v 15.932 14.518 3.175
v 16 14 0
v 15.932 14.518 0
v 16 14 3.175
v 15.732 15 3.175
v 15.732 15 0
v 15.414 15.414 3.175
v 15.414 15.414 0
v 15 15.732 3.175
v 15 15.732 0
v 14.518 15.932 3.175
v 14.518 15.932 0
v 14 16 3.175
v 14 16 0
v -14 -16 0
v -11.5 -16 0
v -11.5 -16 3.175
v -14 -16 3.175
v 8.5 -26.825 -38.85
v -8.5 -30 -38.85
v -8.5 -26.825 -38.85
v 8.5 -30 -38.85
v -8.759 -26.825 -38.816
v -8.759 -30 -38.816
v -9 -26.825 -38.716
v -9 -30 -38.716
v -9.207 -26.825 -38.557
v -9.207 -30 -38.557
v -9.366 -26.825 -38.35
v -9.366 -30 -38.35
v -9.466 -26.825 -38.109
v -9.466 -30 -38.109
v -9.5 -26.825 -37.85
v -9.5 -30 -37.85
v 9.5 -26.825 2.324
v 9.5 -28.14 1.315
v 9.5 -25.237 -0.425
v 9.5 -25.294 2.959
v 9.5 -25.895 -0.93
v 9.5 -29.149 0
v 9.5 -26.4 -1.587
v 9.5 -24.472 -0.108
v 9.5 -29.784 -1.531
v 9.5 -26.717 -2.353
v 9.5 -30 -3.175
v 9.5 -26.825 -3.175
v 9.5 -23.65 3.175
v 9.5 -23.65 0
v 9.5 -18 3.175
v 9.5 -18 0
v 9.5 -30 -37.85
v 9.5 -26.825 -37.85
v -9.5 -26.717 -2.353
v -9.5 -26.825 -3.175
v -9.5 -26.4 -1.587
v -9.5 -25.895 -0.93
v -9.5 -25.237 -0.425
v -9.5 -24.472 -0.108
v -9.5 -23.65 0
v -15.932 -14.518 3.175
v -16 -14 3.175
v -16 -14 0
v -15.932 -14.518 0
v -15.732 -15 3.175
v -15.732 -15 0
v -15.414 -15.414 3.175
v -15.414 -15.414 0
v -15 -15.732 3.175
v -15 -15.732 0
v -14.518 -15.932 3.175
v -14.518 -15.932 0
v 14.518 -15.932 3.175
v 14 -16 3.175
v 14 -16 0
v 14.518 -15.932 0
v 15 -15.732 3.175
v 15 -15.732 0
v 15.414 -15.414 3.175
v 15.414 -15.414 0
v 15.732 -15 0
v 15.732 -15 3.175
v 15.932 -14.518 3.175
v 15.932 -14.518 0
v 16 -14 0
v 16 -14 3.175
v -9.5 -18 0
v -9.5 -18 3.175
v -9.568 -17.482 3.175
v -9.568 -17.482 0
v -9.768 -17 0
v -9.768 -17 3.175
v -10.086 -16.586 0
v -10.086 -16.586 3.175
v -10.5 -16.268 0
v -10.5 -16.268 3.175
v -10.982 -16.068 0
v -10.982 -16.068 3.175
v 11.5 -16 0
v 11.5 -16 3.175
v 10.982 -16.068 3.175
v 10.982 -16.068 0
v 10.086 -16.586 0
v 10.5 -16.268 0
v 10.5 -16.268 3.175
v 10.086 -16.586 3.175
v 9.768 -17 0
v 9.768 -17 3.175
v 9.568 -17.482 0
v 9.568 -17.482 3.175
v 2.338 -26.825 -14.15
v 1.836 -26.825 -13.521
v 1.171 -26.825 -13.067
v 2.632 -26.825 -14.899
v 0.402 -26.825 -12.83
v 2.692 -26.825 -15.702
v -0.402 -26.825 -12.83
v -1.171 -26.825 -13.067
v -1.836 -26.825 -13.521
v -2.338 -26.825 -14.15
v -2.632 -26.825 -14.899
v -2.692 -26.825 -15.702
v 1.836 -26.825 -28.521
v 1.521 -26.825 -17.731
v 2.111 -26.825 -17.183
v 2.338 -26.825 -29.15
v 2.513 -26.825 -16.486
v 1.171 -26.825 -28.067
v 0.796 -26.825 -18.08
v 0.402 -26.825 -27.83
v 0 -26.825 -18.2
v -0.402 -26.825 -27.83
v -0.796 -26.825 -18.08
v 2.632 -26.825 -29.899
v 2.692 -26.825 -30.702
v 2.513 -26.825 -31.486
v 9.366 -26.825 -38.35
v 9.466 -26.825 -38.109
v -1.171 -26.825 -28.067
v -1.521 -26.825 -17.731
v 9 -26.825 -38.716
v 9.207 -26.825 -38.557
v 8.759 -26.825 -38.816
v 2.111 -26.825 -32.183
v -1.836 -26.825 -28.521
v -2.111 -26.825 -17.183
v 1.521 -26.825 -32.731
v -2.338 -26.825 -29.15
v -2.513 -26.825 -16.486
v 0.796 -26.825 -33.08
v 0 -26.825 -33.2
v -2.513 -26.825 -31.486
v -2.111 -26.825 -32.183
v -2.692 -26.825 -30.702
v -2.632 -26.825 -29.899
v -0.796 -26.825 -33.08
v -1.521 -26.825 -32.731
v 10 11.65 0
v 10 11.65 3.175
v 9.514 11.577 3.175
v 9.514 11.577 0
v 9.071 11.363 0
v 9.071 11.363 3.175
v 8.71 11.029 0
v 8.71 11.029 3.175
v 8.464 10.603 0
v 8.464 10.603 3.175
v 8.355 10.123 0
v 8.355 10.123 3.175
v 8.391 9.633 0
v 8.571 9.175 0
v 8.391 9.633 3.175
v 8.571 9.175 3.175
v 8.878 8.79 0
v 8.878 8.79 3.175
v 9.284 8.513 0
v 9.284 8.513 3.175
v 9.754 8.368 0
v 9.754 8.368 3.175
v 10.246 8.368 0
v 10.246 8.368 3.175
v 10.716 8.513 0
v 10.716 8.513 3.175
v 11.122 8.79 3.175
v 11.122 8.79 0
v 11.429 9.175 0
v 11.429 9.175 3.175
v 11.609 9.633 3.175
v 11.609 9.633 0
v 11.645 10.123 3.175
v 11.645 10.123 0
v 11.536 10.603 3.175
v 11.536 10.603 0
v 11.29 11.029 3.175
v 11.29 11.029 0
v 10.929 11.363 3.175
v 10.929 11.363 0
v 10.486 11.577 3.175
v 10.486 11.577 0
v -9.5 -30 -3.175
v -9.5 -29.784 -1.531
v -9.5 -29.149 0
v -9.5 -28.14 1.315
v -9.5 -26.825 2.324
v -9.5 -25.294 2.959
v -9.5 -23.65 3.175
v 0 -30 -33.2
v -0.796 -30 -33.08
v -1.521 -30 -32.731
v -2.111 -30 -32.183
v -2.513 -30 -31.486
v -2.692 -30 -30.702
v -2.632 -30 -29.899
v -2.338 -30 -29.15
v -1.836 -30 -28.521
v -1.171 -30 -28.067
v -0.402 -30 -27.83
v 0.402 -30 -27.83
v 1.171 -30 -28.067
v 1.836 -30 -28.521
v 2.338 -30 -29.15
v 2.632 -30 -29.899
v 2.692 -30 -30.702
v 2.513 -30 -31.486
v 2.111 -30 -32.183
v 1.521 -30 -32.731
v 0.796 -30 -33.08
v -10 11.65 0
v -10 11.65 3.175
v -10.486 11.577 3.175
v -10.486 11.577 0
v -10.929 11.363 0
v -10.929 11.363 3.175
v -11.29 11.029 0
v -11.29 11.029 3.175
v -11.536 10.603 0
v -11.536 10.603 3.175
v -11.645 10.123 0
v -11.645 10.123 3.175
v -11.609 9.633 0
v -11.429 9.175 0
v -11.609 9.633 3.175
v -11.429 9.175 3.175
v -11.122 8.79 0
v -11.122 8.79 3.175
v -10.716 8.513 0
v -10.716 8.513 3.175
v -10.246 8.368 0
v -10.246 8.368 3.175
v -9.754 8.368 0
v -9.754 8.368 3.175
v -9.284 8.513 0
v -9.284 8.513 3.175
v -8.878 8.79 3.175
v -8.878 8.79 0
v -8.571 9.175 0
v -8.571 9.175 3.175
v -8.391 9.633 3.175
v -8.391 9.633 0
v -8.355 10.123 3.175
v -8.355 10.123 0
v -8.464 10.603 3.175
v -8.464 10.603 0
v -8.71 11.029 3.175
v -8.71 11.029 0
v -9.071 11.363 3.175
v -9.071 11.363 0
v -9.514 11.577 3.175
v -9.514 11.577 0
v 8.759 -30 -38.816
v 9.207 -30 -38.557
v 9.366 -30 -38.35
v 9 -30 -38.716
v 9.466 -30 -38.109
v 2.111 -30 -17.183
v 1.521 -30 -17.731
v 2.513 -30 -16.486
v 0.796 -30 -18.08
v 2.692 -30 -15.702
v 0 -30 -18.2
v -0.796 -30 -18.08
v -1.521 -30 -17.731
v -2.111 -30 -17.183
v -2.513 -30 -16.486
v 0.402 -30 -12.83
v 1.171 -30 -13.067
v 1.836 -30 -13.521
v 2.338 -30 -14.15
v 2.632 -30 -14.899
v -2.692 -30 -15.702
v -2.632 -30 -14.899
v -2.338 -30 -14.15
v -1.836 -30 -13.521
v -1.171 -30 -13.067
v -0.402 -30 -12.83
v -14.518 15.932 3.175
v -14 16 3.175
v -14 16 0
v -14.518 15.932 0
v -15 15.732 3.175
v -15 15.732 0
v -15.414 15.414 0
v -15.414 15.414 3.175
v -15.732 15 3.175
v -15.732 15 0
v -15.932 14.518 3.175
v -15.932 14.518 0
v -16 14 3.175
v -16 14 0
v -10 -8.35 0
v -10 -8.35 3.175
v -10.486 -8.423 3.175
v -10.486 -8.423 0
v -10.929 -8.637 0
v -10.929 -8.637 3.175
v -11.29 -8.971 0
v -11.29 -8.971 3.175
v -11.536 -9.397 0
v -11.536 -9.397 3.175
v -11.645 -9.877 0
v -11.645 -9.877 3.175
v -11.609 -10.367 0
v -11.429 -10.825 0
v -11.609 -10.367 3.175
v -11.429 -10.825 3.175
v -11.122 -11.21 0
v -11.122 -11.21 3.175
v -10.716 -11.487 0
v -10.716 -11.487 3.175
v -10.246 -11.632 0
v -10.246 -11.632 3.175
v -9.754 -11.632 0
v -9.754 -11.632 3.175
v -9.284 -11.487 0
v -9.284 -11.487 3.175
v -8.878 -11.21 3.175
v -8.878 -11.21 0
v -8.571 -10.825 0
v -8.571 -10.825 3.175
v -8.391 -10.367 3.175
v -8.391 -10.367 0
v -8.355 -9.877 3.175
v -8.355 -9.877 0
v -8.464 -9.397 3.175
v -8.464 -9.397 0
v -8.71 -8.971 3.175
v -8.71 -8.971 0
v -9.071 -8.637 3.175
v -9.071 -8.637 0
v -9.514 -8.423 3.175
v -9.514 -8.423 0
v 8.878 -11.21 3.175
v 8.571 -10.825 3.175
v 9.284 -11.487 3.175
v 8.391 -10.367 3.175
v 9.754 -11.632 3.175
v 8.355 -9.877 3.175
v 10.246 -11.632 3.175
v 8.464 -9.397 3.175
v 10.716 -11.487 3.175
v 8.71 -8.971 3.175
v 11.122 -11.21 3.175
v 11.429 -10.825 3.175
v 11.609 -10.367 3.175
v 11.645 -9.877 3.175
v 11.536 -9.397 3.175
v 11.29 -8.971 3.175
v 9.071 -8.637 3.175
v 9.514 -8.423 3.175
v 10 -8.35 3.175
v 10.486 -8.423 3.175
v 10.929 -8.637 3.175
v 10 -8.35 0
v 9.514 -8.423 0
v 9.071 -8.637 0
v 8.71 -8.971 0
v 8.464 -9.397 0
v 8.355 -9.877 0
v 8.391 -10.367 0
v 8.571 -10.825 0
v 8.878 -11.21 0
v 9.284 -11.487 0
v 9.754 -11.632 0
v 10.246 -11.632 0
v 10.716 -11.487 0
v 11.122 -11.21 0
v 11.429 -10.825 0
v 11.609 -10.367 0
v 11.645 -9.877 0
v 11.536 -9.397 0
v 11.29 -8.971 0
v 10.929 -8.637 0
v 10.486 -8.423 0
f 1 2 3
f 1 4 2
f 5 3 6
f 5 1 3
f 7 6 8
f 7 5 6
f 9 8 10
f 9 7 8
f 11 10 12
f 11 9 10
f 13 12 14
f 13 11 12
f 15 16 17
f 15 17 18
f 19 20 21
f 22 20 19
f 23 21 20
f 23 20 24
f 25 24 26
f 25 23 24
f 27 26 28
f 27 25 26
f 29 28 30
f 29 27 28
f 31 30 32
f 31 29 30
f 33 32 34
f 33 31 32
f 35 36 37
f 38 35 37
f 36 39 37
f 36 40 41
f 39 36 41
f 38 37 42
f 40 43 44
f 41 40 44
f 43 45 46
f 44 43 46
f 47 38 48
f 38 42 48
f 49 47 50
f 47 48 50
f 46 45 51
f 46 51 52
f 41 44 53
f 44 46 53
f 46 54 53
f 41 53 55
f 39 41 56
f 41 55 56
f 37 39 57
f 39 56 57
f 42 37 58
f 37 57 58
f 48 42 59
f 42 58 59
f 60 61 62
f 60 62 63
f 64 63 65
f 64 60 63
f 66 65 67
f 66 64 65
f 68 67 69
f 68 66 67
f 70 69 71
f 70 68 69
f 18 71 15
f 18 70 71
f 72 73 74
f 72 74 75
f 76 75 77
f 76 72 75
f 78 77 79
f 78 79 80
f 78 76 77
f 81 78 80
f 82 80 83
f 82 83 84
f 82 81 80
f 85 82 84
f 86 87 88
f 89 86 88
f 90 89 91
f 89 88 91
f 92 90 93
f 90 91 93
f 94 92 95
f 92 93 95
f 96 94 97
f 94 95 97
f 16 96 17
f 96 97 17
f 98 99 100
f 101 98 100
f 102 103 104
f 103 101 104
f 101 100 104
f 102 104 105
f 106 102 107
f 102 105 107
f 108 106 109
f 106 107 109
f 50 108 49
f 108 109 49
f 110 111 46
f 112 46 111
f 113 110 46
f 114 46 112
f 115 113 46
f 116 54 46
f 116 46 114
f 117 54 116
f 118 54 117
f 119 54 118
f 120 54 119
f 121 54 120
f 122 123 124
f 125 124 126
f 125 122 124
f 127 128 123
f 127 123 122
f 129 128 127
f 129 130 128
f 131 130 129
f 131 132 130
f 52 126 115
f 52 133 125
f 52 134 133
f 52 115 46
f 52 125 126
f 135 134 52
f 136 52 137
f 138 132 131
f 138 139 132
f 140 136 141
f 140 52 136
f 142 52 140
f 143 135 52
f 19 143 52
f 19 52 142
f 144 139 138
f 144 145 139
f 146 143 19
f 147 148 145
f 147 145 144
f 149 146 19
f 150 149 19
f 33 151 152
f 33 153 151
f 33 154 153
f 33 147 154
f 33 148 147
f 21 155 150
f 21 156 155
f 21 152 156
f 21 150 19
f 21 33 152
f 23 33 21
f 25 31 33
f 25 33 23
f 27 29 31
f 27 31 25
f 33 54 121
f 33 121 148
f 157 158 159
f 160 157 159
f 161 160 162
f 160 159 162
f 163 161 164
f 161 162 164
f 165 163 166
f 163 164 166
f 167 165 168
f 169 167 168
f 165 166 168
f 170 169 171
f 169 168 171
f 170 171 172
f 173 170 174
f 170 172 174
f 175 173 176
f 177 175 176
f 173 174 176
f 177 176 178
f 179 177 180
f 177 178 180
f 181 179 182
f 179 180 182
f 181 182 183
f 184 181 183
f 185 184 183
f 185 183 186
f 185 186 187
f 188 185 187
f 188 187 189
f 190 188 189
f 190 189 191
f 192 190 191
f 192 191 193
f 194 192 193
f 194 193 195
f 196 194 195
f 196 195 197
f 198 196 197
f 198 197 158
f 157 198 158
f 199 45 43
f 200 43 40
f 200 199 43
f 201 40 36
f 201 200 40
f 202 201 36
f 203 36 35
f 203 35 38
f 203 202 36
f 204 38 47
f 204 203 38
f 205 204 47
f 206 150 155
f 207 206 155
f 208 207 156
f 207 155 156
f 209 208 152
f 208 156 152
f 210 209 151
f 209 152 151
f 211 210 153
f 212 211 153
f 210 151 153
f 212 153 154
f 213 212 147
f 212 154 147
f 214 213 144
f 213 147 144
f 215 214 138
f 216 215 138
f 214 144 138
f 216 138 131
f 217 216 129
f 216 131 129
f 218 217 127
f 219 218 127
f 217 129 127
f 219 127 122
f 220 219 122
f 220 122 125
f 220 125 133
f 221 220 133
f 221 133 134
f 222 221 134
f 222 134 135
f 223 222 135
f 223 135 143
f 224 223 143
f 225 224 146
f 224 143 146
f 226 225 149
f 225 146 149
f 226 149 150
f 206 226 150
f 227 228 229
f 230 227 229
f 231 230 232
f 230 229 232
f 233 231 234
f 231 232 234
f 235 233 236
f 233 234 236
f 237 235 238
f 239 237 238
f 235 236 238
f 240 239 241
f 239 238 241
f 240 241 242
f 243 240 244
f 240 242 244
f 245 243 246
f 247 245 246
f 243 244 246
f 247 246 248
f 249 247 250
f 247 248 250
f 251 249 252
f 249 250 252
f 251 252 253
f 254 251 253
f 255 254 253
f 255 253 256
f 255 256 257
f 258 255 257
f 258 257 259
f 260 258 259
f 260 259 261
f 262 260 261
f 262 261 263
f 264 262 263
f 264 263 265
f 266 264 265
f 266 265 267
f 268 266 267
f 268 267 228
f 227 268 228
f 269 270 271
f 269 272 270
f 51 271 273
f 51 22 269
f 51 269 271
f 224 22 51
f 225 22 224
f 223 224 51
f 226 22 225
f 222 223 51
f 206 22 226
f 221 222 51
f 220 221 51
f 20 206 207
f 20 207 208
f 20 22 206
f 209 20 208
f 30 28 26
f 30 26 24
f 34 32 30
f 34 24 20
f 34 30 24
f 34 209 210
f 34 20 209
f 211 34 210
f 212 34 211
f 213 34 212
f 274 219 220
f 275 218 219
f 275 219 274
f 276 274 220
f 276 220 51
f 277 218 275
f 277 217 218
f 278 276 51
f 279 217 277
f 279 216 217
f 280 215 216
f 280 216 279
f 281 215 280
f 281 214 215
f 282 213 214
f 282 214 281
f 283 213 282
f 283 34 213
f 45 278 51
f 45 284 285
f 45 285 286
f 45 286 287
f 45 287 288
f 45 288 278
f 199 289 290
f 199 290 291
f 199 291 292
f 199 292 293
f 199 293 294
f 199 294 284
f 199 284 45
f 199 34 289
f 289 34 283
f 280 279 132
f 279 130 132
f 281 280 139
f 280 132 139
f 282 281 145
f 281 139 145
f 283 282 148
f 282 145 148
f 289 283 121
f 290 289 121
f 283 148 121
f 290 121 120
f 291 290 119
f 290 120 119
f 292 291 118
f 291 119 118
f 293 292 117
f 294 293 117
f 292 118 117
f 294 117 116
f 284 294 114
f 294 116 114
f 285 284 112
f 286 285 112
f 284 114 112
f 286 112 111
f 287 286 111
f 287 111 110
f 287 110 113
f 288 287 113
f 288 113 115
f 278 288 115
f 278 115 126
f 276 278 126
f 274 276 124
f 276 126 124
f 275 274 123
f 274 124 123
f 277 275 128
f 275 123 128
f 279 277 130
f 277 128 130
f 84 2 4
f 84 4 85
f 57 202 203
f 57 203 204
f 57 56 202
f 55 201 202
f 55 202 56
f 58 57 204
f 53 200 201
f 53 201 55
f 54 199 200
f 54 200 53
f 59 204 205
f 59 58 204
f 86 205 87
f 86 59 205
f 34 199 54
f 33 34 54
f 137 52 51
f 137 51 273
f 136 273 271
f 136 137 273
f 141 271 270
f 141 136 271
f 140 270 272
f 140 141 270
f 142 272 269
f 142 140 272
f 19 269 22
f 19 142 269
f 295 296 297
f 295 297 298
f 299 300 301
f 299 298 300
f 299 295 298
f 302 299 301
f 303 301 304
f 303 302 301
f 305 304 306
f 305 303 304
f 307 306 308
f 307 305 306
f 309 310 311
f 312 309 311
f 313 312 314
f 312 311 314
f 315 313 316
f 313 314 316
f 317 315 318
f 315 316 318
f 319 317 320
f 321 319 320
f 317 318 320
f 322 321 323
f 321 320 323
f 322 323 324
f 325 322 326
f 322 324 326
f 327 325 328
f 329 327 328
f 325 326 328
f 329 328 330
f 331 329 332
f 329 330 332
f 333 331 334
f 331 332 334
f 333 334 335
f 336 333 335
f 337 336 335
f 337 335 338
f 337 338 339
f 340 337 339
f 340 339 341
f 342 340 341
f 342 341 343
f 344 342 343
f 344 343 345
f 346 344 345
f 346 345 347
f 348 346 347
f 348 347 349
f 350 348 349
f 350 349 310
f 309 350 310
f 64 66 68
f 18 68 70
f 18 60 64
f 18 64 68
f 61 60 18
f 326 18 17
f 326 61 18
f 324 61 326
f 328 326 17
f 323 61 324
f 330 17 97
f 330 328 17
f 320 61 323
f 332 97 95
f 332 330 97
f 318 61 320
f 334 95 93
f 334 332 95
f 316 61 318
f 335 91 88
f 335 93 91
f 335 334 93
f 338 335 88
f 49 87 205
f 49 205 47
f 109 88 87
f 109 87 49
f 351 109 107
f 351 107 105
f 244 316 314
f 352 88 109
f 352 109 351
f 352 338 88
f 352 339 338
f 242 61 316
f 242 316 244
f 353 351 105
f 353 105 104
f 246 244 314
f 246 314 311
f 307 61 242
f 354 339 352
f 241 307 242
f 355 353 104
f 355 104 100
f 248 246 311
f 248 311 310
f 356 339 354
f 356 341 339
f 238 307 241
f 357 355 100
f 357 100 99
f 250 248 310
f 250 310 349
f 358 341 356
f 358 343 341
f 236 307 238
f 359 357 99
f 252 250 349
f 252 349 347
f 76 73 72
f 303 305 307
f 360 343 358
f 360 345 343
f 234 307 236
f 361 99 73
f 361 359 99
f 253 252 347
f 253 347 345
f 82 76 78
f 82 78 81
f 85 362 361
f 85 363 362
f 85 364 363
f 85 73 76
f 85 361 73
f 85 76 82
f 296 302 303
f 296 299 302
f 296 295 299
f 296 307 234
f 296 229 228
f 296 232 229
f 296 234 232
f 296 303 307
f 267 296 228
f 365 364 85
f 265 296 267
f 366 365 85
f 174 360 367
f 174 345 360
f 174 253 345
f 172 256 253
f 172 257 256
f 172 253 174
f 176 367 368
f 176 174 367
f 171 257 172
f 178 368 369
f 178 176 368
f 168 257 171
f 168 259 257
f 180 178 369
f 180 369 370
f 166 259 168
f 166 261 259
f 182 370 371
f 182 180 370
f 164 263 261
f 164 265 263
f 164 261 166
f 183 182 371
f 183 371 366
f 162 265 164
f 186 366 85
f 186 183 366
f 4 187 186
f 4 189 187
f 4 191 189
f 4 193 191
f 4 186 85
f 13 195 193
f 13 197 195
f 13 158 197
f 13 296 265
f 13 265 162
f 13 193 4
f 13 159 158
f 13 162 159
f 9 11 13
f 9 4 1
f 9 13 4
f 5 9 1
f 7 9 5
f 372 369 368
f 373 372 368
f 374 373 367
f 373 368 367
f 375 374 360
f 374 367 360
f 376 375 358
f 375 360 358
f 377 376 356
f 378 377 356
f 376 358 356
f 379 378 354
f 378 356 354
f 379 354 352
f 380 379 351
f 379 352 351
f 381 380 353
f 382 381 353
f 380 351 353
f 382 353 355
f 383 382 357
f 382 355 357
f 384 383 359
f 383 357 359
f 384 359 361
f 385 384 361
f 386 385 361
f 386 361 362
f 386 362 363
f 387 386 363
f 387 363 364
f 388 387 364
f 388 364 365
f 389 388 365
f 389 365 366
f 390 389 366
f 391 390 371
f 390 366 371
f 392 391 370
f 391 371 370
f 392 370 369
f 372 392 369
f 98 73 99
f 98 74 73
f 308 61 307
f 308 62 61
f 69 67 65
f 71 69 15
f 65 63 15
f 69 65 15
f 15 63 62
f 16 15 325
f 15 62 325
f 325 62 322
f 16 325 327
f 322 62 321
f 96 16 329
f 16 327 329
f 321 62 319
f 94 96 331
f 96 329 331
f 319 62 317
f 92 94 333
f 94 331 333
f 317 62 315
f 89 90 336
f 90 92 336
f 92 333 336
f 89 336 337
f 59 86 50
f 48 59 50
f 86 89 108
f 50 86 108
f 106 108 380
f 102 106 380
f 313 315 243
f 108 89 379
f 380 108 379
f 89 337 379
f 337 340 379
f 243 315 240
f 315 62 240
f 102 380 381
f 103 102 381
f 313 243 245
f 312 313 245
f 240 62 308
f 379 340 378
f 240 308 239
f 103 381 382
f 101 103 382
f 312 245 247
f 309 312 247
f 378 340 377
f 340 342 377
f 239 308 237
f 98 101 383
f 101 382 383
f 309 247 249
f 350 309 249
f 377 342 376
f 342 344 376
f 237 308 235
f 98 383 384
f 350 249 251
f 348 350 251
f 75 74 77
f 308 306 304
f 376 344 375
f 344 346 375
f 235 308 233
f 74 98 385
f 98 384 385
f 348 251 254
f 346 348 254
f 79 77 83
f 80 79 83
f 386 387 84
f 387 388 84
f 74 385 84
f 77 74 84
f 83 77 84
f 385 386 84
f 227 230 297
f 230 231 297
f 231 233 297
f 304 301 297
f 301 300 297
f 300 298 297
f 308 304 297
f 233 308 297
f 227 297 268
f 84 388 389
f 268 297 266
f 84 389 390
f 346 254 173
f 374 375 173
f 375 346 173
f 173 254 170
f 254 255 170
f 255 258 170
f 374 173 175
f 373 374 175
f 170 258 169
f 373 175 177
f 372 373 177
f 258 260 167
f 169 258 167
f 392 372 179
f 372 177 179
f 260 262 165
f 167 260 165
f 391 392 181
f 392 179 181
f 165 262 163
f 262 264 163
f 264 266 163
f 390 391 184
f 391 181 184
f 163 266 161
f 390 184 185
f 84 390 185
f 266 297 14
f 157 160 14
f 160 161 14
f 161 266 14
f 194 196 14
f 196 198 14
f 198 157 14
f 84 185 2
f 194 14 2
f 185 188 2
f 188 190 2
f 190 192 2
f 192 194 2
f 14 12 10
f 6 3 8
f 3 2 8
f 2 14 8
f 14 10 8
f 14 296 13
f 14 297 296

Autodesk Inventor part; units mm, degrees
ref_plane "YZ Plane" through (0, 0, 0) normal (1, 0, 0) x (0, 1, 0)
ref_plane "XZ Plane" through (0, 0, 0) normal (0, 1, 0) x (-1, 0, 0)
ref_plane "XY Plane" through (0, 0, 0) normal (0, 0, 1) x (1, 0, 0)
sketch "Sketch1" plane through (0, 0, 0) normal (0, 0, 1) x (1, 0, 0)
  line L0 (16, -16) -> (-16, -16)
  line L1 (-16, -16) -> (-16, 16)
  line L2 (-16, 16) -> (16, 16)
  line L3 (16, 16) -> (16, -16)
  line L4 (16, -16) -> (-16, 16) construction
  line L5 (-16, -16) -> (16, 16) construction
  line L6 (10, -10) -> (-10, -10) construction
  line L7 (-10, -10) -> (-10, 10) construction
  line L8 (-10, 10) -> (10, 10) construction
  line L9 (10, 10) -> (10, -10) construction
  line L10 (10, -10) -> (-10, 10) construction
  line L11 (-10, -10) -> (10, 10) construction
  line L12 (-9.5, -16) -> (9.5, -16)
  line L13 (9.5, -16) -> (9.5, -30)
  line L14 (9.5, -30) -> (-9.5, -30)
  line L15 (-9.5, -30) -> (-9.5, -16)
  point P0 (0, 0)
  point P1 (0, -16)
  dimension "d0" = 32
  dimension "d1" = 32
  dimension "d2" = 20
  dimension "d3" = 20
  dimension "d4" = 19
  dimension "d5" = 30
extrude "Plate1" add sketch "Sketch1" along normal blind 3.175
sketch "Sketch2" plane through (-9.5, -26.825, 3.175) normal (0, -1, 0) x (1, 0, 0)
  line L0 (19, 0) -> (0, 0)
  line L1 (0, 0) -> (0, -50)
  line L2 (0, -50) -> (19, -50)
  line L3 (19, -50) -> (19, 0)
edge flange "Flange1" height 50 angle 90 thickness 3.175 bend radius 3.175 thickness toward (0, -1, 0) relief tear relief width 3.175 relief depth 1.5875 edges at (0, -30, 0) wall of the first edge with corners at (9.5, -26.825, 3.175) (-9.5, -26.825, 3.175) (-9.5, -26.825, -46.825) (9.5, -26.825, -46.825)
bend "Bend1"
corner "Corner1"
fillet "Fillet1" radius 2 6 edges at (-16, -16, 1.5875) (-16, 16, 1.5875) (16, 16, 1.5875) (16, -16, 1.5875) (9.5, -16, 1.5875) (-9.5, -16, 1.5875)
hole "Hole1" at (10, -10, 0) at (10, 10, 0) at (-10, 10, 0) at (-10, -10, 0) direction (0, 0, 1) diameter 3.3 end through all
sketch "Sketch3" plane through (-9.5, -30, -46.825) normal (0, -1, 0) x (1, 0, 0)
  line L0 (1.15, 46.825) -> (-2.15, 46.825) construction
  line L1 (1.15, 46.825) -> (-2.15, 46.825) construction
  line L2 (21.15, 46.825) -> (17.85, 46.825) construction
  line L3 (21.15, 46.825) -> (17.85, 46.825) construction
  line L4 (23.5, 46.825) -> (25.5, 46.825) construction
  line L5 (21, 46.825) -> (23.5, 46.825) construction
  line L6 (19, 46.825) -> (21, 46.825) construction
  line L7 (19, 46.825) -> (0, 46.825) construction
  line L8 (-2, 46.825) -> (0, 46.825) construction
  line L9 (-4.5, 46.825) -> (-2, 46.825) construction
  line L10 (-6.5, 46.825) -> (-4.5, 46.825) construction
  line L11 (-4.5, 46.825) -> (-6.5, 46.825) construction
  line L12 (23.5, 46.825) -> (-4.5, 46.825) construction
  line L13 (25.5, 46.825) -> (23.5, 46.825) construction
  line L14 (0, 0) -> (0, 43.65) construction
  line L15 (19, 24.975) -> (0, 24.975) construction
  line L16 (0, 24.975) -> (0, 37.675) construction
  line L17 (0, 37.675) -> (19, 37.675) construction
  line L18 (19, 37.675) -> (19, 24.975) construction
  line L19 (19, 24.975) -> (0, 37.675) construction
  line L20 (0, 24.975) -> (19, 37.675) construction
  line L21 (19, 43.65) -> (19, 0) construction
  line L22 (0, 33.825) -> (19, 33.825) construction
  line L23 (19, 33.825) -> (19, 13.825) construction
  line L24 (19, 13.825) -> (0, 13.825) construction
  line L25 (0, 13.825) -> (0, 33.825) construction
  line L26 (19, 9.975) -> (0, 9.975) construction
  line L27 (0, 9.975) -> (0, 22.675) construction
  line L28 (0, 22.675) -> (19, 22.675) construction
  line L29 (19, 22.675) -> (19, 9.975) construction
  line L30 (19, 9.975) -> (0, 22.675) construction
  line L31 (0, 9.975) -> (19, 22.675) construction
  line L32 (0, 33.825) -> (19, 13.825) construction
  line L33 (0, 13.825) -> (19, 33.825) construction
  line L34 (19, 43.65) -> (0, 43.65) projected
  line L35 (0, 0) -> (0, 43.65) projected
  line L36 (19, 0) -> (0, 0) projected
  line L37 (19, 43.65) -> (19, 0) projected
  line L38 (0, 7.975) -> (19, 7.975)
  point P0 (9.5, 46.825)
  point P1 (9.5, 31.325)
  point P2 (9.5, 46.825)
  point P3 (9.5, 16.325)
  point P4 (9.5, 23.825)
  point P5 (9.5, 23.825)
  point P6 (19, 9.975)
  point P7 (0, 9.975)
  dimension "d25" = 12.7
  dimension "d27" = 20
  dimension "d28" = 13
  dimension "d29" = 7.5
  dimension "d30" = 7.5
  dimension "d33" = 2
extrude "Extrusion1" cut sketch "Sketch3" against normal through all contours L37 L36 L35 L38
fillet "Fillet2" radius 1 2 edges at (9.5, -28.4125, -38.85) (-9.5, -28.4125, -38.85)
hole "Hole2" at (0, -30, -15.5) at (0, -30, -30.5) direction (0, 1, 0) diameter 5.4 end through all
equation "\"d23\" = Thickness"
equation "\"d6\" = Thickness"
equation "\"d7\" = BendReliefWidth"
equation "\"d8\" = BendReliefDepth"
equation "\"d9\" = MinimumRemnant"
equation "\"d10\" = TransitionRadius"
equation "\"d13\" = BendRadius"
equation "\"d14\" = CornerReliefSize"
equation "\"d15\" = GapSize"
equation "\"d16\" = JacobiRadiusSize"
equation "\"d30\" = d29"
equation "\"BendReliefWidth\" = Thickness"
equation "\"BendReliefDepth\" = 0.5 * Thickness"
equation "\"CornerReliefSize\" = 4 * Thickness"
equation "\"MinimumRemnant\" = 2 * Thickness"
equation "\"TransitionRadius\" = BendRadius"
equation "\"JacobiRadiusSize\" = BendRadius"
equation "\"GapSize\" = Thickness"
equation "\"Thickness\" = 3.175"
equation "\"BendRadius\" = 3.175"
properties part number "Printhead Belt Retainer Bracket" material "Aluminum 6061"
